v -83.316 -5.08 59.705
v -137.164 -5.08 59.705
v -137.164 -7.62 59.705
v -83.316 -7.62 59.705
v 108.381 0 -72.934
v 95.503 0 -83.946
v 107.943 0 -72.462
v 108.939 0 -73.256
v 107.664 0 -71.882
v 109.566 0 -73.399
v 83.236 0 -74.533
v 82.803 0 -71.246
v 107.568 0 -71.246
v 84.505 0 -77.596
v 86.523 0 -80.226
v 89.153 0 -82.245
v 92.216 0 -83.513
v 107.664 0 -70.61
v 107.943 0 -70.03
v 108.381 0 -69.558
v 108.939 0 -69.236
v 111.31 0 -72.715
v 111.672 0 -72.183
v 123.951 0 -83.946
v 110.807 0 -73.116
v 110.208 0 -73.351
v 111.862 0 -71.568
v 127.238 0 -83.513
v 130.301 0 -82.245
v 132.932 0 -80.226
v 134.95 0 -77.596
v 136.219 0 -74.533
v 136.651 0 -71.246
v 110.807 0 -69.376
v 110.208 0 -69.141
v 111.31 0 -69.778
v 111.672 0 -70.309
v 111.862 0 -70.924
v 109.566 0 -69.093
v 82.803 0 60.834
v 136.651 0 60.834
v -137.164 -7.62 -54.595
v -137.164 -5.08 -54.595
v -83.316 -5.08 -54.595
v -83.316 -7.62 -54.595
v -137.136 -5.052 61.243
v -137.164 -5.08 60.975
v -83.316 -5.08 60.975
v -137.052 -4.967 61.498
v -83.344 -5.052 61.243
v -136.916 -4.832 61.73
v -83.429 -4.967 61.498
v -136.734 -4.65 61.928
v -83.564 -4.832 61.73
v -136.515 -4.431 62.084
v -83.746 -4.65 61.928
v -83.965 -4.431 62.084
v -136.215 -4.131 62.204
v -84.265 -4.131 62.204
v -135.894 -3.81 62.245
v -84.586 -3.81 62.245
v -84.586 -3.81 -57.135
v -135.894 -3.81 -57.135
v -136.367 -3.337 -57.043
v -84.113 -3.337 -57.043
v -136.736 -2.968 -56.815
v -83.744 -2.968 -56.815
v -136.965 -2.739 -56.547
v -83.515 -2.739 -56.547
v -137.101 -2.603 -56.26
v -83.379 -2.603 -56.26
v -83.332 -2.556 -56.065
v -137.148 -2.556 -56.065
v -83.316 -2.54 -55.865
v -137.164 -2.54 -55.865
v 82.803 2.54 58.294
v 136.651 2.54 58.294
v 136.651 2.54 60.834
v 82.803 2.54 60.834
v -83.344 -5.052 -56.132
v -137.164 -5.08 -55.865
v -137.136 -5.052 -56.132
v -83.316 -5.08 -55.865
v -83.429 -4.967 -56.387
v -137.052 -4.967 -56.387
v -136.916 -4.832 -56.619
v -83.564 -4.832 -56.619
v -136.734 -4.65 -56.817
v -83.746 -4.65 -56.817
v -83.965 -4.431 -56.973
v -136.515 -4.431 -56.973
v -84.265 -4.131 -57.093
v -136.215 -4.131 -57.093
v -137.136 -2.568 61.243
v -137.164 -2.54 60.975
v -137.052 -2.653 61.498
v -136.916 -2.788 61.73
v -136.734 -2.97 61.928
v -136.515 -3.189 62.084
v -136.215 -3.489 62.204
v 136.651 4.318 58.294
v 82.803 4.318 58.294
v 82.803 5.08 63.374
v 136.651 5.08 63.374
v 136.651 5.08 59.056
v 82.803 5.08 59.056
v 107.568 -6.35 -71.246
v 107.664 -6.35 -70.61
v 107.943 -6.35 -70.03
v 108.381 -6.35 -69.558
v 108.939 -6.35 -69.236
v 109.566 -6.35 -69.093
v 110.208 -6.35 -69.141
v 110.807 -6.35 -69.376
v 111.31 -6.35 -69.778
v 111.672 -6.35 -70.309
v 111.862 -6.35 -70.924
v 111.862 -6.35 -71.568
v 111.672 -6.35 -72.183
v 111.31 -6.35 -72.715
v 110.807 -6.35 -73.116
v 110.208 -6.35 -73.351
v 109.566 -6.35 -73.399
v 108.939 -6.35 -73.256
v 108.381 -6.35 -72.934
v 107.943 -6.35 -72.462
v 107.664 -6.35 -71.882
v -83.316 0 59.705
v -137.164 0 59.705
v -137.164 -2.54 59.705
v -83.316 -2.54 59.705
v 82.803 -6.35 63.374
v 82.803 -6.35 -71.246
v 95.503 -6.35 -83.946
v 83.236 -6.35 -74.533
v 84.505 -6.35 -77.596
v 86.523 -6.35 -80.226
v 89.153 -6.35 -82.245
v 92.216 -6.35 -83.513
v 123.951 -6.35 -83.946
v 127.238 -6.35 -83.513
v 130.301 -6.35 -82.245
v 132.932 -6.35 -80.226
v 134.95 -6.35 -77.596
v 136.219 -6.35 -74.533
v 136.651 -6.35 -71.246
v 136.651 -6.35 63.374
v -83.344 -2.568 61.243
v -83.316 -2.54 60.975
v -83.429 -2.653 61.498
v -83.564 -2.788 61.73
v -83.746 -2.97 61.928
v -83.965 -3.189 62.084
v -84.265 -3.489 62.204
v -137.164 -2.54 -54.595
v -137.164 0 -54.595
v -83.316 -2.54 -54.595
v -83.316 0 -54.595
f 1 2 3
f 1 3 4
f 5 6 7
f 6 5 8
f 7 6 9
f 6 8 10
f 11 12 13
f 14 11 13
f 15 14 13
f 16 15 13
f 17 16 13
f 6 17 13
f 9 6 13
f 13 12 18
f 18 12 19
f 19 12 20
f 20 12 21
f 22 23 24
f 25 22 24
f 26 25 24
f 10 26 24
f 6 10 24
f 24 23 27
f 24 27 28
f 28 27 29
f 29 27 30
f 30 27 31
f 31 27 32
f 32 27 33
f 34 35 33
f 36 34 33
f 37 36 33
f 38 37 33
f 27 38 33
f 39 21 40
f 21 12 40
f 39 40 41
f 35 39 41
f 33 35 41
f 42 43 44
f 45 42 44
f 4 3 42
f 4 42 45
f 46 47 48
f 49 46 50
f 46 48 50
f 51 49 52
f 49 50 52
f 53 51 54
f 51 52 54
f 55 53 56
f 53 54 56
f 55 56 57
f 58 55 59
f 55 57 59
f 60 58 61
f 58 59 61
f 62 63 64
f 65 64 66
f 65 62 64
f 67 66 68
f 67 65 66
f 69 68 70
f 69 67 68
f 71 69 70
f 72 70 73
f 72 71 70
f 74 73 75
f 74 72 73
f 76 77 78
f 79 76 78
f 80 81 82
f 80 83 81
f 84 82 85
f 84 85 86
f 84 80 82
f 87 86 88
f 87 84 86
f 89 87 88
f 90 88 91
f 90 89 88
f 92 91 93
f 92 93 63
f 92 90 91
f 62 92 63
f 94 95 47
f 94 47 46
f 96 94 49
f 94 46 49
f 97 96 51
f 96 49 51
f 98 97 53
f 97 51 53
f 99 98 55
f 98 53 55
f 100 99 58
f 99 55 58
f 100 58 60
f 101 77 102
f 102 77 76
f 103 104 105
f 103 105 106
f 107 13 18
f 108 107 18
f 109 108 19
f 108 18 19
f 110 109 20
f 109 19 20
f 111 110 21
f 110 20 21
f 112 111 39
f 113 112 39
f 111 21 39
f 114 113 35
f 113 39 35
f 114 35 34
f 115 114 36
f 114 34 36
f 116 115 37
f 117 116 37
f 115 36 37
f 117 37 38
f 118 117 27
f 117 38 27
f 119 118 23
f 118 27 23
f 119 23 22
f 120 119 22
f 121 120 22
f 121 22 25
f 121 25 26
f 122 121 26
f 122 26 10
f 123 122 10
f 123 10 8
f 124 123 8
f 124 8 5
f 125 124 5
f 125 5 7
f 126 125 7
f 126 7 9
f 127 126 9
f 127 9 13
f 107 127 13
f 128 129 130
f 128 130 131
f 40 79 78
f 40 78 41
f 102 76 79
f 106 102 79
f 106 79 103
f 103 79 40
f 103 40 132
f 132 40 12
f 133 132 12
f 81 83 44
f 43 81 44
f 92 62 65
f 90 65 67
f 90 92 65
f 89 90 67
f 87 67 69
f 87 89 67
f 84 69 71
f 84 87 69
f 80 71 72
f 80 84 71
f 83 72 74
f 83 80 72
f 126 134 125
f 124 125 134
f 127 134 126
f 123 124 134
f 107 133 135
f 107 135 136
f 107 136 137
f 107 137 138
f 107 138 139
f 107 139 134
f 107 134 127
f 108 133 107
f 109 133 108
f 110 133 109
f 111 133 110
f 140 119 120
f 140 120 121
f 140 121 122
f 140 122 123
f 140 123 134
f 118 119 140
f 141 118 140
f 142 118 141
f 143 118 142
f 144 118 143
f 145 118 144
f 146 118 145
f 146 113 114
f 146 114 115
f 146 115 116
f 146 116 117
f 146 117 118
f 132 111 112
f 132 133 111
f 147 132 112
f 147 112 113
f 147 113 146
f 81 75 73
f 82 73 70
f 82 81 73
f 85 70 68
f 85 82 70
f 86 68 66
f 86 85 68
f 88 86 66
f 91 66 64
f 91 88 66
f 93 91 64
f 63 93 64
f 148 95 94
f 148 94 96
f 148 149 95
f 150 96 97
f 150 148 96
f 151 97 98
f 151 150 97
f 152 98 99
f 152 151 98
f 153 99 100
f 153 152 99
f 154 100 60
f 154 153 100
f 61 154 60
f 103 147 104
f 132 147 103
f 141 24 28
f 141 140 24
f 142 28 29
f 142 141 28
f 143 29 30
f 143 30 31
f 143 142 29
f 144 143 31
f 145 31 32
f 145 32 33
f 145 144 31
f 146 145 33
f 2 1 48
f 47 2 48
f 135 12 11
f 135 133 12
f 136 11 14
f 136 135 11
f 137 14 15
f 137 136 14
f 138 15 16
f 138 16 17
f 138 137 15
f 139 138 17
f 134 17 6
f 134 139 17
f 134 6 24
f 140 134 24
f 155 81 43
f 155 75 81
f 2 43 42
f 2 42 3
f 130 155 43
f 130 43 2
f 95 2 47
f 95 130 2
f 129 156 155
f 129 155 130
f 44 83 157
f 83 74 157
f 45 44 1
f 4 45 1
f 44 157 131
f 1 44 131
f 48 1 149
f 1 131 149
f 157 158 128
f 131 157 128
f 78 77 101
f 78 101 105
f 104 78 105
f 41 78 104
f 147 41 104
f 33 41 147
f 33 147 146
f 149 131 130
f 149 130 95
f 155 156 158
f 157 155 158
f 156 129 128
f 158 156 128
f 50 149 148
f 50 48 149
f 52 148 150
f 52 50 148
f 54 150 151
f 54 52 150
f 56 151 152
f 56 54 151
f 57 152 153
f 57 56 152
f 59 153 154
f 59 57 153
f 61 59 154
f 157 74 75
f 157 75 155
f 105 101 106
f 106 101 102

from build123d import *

# Parameters (mm, degrees)
F0_W      = 53.848
F0_H      = 114.3
F1_DEPTH  = 7.62
F2_W      = 2.54
F2_H      = 2.54
F3_DEPTH  = 53.848
F4_R      = 1.26999
F5_R      = 1.26999
F6_W      = 53.848
F6_H      = 147.32
F7_DEPTH  = 6.35
F8_R      = 12.7
F9_W      = 53.848
F9_H      = 5.08
F10_DEPTH = 5.08
F11_W     = 2.54
F11_H     = 2.54
F12_DEPTH = 76.2
F13_SIZE  = 0.762
F14_R     = 2.159
F15_DEPTH = 25.4


# Not quite as in the source:
# - a fillet or chamfer is up to 0.001 mm smaller than in the source, because OpenCascade refuses the exact size


with BuildPart() as f1:
    # F0 (on Front) → F1 (new body)
    with BuildSketch(Plane.XZ):
        with Locations((-110.2400206625, 2.555437386)):
            Rectangle(F0_W, F0_H)
    extrude(amount=F1_DEPTH)

    # F2 (on face) → F3 (join)
    with BuildSketch(Plane(origin=(-137.1640206625, 0, 0), x_dir=(0, -1, 0), z_dir=(-1, 0, 0))):
        with Locations((3.81, -55.864562614)):
            Rectangle(F2_W, F2_H)
        with Locations((3.81, 60.975437386)):
            Rectangle(F2_W, F2_H)
    extrude(amount=-F3_DEPTH)

    # F4 (radius 1.27 in the source; OpenCascade refuses exactly that, so slightly less here)
    f4_edges = [f1.edges().sort_by_distance(p)[0] for p in [
        (-110.240021, -2.54, 62.245437),
        (-110.240021, -5.08, 62.245437),
        (-137.164021, -3.81, 62.245437),
        (-83.316021, -3.81, 62.245437),
    ]]
    fillet(f4_edges, radius=F4_R)

    # F5 (radius 1.27 in the source; OpenCascade refuses exactly that, so slightly less here)
    f5_edges = [f1.edges().sort_by_distance(p)[0] for p in [
        (-110.240021, -5.08, -57.134563),
        (-110.240021, -2.54, -57.134563),
        (-83.316021, -3.81, -57.134563),
        (-137.164021, -3.81, -57.134563),
    ]]
    fillet(f5_edges, radius=F5_R)


with BuildPart() as f7:
    # F6 (on Front) → F7 (new body)
    with BuildSketch(Plane.XZ):
        with Locations((109.727306695, -10.2860404956)):
            Rectangle(F6_W, F6_H)
    extrude(amount=F7_DEPTH)

    # F8
    f8_edges = [f7.edges().sort_by_distance(p)[0] for p in [
        (136.651307, -3.175, -83.94604),
        (82.803307, -3.175, -83.94604),
    ]]
    fillet(f8_edges, radius=F8_R)

    # F9 (on face) → F10 (join)
    with BuildSketch(Plane(origin=(0, 0, 0), x_dir=(-1, 0, 0), z_dir=(0, 1, 0))):
        with Locations((-109.727306695, 60.8339595044)):
            Rectangle(F9_W, F9_H)
    extrude(amount=F10_DEPTH)

    # F11 (on face) → F12 (cut)
    with BuildSketch(Plane(origin=(82.803306695, 0, 0), x_dir=(0, -1, 0), z_dir=(-1, 0, 0))):
        with Locations((-1.27, 59.5639595044)):
            Rectangle(F11_W, F11_H)
    extrude(amount=-F12_DEPTH, mode=Mode.SUBTRACT)

    # F13
    f13_edges = [f7.edges().sort_by_distance(p)[0] for p in [
        (109.727307, 5.08, 58.29396),
    ]]
    chamfer(f13_edges, length=F13_SIZE)

    # F14 (on face) → F15 (cut)
    with BuildSketch(Plane(origin=(0, 0, 0), x_dir=(-1, 0, 0), z_dir=(0, 1, 0))):
        with Locations((-109.727306695, -71.2460404956)):
            Circle(F14_R)
    extrude(amount=-F15_DEPTH, mode=Mode.SUBTRACT)


solid = Compound([f1.part, f7.part])
